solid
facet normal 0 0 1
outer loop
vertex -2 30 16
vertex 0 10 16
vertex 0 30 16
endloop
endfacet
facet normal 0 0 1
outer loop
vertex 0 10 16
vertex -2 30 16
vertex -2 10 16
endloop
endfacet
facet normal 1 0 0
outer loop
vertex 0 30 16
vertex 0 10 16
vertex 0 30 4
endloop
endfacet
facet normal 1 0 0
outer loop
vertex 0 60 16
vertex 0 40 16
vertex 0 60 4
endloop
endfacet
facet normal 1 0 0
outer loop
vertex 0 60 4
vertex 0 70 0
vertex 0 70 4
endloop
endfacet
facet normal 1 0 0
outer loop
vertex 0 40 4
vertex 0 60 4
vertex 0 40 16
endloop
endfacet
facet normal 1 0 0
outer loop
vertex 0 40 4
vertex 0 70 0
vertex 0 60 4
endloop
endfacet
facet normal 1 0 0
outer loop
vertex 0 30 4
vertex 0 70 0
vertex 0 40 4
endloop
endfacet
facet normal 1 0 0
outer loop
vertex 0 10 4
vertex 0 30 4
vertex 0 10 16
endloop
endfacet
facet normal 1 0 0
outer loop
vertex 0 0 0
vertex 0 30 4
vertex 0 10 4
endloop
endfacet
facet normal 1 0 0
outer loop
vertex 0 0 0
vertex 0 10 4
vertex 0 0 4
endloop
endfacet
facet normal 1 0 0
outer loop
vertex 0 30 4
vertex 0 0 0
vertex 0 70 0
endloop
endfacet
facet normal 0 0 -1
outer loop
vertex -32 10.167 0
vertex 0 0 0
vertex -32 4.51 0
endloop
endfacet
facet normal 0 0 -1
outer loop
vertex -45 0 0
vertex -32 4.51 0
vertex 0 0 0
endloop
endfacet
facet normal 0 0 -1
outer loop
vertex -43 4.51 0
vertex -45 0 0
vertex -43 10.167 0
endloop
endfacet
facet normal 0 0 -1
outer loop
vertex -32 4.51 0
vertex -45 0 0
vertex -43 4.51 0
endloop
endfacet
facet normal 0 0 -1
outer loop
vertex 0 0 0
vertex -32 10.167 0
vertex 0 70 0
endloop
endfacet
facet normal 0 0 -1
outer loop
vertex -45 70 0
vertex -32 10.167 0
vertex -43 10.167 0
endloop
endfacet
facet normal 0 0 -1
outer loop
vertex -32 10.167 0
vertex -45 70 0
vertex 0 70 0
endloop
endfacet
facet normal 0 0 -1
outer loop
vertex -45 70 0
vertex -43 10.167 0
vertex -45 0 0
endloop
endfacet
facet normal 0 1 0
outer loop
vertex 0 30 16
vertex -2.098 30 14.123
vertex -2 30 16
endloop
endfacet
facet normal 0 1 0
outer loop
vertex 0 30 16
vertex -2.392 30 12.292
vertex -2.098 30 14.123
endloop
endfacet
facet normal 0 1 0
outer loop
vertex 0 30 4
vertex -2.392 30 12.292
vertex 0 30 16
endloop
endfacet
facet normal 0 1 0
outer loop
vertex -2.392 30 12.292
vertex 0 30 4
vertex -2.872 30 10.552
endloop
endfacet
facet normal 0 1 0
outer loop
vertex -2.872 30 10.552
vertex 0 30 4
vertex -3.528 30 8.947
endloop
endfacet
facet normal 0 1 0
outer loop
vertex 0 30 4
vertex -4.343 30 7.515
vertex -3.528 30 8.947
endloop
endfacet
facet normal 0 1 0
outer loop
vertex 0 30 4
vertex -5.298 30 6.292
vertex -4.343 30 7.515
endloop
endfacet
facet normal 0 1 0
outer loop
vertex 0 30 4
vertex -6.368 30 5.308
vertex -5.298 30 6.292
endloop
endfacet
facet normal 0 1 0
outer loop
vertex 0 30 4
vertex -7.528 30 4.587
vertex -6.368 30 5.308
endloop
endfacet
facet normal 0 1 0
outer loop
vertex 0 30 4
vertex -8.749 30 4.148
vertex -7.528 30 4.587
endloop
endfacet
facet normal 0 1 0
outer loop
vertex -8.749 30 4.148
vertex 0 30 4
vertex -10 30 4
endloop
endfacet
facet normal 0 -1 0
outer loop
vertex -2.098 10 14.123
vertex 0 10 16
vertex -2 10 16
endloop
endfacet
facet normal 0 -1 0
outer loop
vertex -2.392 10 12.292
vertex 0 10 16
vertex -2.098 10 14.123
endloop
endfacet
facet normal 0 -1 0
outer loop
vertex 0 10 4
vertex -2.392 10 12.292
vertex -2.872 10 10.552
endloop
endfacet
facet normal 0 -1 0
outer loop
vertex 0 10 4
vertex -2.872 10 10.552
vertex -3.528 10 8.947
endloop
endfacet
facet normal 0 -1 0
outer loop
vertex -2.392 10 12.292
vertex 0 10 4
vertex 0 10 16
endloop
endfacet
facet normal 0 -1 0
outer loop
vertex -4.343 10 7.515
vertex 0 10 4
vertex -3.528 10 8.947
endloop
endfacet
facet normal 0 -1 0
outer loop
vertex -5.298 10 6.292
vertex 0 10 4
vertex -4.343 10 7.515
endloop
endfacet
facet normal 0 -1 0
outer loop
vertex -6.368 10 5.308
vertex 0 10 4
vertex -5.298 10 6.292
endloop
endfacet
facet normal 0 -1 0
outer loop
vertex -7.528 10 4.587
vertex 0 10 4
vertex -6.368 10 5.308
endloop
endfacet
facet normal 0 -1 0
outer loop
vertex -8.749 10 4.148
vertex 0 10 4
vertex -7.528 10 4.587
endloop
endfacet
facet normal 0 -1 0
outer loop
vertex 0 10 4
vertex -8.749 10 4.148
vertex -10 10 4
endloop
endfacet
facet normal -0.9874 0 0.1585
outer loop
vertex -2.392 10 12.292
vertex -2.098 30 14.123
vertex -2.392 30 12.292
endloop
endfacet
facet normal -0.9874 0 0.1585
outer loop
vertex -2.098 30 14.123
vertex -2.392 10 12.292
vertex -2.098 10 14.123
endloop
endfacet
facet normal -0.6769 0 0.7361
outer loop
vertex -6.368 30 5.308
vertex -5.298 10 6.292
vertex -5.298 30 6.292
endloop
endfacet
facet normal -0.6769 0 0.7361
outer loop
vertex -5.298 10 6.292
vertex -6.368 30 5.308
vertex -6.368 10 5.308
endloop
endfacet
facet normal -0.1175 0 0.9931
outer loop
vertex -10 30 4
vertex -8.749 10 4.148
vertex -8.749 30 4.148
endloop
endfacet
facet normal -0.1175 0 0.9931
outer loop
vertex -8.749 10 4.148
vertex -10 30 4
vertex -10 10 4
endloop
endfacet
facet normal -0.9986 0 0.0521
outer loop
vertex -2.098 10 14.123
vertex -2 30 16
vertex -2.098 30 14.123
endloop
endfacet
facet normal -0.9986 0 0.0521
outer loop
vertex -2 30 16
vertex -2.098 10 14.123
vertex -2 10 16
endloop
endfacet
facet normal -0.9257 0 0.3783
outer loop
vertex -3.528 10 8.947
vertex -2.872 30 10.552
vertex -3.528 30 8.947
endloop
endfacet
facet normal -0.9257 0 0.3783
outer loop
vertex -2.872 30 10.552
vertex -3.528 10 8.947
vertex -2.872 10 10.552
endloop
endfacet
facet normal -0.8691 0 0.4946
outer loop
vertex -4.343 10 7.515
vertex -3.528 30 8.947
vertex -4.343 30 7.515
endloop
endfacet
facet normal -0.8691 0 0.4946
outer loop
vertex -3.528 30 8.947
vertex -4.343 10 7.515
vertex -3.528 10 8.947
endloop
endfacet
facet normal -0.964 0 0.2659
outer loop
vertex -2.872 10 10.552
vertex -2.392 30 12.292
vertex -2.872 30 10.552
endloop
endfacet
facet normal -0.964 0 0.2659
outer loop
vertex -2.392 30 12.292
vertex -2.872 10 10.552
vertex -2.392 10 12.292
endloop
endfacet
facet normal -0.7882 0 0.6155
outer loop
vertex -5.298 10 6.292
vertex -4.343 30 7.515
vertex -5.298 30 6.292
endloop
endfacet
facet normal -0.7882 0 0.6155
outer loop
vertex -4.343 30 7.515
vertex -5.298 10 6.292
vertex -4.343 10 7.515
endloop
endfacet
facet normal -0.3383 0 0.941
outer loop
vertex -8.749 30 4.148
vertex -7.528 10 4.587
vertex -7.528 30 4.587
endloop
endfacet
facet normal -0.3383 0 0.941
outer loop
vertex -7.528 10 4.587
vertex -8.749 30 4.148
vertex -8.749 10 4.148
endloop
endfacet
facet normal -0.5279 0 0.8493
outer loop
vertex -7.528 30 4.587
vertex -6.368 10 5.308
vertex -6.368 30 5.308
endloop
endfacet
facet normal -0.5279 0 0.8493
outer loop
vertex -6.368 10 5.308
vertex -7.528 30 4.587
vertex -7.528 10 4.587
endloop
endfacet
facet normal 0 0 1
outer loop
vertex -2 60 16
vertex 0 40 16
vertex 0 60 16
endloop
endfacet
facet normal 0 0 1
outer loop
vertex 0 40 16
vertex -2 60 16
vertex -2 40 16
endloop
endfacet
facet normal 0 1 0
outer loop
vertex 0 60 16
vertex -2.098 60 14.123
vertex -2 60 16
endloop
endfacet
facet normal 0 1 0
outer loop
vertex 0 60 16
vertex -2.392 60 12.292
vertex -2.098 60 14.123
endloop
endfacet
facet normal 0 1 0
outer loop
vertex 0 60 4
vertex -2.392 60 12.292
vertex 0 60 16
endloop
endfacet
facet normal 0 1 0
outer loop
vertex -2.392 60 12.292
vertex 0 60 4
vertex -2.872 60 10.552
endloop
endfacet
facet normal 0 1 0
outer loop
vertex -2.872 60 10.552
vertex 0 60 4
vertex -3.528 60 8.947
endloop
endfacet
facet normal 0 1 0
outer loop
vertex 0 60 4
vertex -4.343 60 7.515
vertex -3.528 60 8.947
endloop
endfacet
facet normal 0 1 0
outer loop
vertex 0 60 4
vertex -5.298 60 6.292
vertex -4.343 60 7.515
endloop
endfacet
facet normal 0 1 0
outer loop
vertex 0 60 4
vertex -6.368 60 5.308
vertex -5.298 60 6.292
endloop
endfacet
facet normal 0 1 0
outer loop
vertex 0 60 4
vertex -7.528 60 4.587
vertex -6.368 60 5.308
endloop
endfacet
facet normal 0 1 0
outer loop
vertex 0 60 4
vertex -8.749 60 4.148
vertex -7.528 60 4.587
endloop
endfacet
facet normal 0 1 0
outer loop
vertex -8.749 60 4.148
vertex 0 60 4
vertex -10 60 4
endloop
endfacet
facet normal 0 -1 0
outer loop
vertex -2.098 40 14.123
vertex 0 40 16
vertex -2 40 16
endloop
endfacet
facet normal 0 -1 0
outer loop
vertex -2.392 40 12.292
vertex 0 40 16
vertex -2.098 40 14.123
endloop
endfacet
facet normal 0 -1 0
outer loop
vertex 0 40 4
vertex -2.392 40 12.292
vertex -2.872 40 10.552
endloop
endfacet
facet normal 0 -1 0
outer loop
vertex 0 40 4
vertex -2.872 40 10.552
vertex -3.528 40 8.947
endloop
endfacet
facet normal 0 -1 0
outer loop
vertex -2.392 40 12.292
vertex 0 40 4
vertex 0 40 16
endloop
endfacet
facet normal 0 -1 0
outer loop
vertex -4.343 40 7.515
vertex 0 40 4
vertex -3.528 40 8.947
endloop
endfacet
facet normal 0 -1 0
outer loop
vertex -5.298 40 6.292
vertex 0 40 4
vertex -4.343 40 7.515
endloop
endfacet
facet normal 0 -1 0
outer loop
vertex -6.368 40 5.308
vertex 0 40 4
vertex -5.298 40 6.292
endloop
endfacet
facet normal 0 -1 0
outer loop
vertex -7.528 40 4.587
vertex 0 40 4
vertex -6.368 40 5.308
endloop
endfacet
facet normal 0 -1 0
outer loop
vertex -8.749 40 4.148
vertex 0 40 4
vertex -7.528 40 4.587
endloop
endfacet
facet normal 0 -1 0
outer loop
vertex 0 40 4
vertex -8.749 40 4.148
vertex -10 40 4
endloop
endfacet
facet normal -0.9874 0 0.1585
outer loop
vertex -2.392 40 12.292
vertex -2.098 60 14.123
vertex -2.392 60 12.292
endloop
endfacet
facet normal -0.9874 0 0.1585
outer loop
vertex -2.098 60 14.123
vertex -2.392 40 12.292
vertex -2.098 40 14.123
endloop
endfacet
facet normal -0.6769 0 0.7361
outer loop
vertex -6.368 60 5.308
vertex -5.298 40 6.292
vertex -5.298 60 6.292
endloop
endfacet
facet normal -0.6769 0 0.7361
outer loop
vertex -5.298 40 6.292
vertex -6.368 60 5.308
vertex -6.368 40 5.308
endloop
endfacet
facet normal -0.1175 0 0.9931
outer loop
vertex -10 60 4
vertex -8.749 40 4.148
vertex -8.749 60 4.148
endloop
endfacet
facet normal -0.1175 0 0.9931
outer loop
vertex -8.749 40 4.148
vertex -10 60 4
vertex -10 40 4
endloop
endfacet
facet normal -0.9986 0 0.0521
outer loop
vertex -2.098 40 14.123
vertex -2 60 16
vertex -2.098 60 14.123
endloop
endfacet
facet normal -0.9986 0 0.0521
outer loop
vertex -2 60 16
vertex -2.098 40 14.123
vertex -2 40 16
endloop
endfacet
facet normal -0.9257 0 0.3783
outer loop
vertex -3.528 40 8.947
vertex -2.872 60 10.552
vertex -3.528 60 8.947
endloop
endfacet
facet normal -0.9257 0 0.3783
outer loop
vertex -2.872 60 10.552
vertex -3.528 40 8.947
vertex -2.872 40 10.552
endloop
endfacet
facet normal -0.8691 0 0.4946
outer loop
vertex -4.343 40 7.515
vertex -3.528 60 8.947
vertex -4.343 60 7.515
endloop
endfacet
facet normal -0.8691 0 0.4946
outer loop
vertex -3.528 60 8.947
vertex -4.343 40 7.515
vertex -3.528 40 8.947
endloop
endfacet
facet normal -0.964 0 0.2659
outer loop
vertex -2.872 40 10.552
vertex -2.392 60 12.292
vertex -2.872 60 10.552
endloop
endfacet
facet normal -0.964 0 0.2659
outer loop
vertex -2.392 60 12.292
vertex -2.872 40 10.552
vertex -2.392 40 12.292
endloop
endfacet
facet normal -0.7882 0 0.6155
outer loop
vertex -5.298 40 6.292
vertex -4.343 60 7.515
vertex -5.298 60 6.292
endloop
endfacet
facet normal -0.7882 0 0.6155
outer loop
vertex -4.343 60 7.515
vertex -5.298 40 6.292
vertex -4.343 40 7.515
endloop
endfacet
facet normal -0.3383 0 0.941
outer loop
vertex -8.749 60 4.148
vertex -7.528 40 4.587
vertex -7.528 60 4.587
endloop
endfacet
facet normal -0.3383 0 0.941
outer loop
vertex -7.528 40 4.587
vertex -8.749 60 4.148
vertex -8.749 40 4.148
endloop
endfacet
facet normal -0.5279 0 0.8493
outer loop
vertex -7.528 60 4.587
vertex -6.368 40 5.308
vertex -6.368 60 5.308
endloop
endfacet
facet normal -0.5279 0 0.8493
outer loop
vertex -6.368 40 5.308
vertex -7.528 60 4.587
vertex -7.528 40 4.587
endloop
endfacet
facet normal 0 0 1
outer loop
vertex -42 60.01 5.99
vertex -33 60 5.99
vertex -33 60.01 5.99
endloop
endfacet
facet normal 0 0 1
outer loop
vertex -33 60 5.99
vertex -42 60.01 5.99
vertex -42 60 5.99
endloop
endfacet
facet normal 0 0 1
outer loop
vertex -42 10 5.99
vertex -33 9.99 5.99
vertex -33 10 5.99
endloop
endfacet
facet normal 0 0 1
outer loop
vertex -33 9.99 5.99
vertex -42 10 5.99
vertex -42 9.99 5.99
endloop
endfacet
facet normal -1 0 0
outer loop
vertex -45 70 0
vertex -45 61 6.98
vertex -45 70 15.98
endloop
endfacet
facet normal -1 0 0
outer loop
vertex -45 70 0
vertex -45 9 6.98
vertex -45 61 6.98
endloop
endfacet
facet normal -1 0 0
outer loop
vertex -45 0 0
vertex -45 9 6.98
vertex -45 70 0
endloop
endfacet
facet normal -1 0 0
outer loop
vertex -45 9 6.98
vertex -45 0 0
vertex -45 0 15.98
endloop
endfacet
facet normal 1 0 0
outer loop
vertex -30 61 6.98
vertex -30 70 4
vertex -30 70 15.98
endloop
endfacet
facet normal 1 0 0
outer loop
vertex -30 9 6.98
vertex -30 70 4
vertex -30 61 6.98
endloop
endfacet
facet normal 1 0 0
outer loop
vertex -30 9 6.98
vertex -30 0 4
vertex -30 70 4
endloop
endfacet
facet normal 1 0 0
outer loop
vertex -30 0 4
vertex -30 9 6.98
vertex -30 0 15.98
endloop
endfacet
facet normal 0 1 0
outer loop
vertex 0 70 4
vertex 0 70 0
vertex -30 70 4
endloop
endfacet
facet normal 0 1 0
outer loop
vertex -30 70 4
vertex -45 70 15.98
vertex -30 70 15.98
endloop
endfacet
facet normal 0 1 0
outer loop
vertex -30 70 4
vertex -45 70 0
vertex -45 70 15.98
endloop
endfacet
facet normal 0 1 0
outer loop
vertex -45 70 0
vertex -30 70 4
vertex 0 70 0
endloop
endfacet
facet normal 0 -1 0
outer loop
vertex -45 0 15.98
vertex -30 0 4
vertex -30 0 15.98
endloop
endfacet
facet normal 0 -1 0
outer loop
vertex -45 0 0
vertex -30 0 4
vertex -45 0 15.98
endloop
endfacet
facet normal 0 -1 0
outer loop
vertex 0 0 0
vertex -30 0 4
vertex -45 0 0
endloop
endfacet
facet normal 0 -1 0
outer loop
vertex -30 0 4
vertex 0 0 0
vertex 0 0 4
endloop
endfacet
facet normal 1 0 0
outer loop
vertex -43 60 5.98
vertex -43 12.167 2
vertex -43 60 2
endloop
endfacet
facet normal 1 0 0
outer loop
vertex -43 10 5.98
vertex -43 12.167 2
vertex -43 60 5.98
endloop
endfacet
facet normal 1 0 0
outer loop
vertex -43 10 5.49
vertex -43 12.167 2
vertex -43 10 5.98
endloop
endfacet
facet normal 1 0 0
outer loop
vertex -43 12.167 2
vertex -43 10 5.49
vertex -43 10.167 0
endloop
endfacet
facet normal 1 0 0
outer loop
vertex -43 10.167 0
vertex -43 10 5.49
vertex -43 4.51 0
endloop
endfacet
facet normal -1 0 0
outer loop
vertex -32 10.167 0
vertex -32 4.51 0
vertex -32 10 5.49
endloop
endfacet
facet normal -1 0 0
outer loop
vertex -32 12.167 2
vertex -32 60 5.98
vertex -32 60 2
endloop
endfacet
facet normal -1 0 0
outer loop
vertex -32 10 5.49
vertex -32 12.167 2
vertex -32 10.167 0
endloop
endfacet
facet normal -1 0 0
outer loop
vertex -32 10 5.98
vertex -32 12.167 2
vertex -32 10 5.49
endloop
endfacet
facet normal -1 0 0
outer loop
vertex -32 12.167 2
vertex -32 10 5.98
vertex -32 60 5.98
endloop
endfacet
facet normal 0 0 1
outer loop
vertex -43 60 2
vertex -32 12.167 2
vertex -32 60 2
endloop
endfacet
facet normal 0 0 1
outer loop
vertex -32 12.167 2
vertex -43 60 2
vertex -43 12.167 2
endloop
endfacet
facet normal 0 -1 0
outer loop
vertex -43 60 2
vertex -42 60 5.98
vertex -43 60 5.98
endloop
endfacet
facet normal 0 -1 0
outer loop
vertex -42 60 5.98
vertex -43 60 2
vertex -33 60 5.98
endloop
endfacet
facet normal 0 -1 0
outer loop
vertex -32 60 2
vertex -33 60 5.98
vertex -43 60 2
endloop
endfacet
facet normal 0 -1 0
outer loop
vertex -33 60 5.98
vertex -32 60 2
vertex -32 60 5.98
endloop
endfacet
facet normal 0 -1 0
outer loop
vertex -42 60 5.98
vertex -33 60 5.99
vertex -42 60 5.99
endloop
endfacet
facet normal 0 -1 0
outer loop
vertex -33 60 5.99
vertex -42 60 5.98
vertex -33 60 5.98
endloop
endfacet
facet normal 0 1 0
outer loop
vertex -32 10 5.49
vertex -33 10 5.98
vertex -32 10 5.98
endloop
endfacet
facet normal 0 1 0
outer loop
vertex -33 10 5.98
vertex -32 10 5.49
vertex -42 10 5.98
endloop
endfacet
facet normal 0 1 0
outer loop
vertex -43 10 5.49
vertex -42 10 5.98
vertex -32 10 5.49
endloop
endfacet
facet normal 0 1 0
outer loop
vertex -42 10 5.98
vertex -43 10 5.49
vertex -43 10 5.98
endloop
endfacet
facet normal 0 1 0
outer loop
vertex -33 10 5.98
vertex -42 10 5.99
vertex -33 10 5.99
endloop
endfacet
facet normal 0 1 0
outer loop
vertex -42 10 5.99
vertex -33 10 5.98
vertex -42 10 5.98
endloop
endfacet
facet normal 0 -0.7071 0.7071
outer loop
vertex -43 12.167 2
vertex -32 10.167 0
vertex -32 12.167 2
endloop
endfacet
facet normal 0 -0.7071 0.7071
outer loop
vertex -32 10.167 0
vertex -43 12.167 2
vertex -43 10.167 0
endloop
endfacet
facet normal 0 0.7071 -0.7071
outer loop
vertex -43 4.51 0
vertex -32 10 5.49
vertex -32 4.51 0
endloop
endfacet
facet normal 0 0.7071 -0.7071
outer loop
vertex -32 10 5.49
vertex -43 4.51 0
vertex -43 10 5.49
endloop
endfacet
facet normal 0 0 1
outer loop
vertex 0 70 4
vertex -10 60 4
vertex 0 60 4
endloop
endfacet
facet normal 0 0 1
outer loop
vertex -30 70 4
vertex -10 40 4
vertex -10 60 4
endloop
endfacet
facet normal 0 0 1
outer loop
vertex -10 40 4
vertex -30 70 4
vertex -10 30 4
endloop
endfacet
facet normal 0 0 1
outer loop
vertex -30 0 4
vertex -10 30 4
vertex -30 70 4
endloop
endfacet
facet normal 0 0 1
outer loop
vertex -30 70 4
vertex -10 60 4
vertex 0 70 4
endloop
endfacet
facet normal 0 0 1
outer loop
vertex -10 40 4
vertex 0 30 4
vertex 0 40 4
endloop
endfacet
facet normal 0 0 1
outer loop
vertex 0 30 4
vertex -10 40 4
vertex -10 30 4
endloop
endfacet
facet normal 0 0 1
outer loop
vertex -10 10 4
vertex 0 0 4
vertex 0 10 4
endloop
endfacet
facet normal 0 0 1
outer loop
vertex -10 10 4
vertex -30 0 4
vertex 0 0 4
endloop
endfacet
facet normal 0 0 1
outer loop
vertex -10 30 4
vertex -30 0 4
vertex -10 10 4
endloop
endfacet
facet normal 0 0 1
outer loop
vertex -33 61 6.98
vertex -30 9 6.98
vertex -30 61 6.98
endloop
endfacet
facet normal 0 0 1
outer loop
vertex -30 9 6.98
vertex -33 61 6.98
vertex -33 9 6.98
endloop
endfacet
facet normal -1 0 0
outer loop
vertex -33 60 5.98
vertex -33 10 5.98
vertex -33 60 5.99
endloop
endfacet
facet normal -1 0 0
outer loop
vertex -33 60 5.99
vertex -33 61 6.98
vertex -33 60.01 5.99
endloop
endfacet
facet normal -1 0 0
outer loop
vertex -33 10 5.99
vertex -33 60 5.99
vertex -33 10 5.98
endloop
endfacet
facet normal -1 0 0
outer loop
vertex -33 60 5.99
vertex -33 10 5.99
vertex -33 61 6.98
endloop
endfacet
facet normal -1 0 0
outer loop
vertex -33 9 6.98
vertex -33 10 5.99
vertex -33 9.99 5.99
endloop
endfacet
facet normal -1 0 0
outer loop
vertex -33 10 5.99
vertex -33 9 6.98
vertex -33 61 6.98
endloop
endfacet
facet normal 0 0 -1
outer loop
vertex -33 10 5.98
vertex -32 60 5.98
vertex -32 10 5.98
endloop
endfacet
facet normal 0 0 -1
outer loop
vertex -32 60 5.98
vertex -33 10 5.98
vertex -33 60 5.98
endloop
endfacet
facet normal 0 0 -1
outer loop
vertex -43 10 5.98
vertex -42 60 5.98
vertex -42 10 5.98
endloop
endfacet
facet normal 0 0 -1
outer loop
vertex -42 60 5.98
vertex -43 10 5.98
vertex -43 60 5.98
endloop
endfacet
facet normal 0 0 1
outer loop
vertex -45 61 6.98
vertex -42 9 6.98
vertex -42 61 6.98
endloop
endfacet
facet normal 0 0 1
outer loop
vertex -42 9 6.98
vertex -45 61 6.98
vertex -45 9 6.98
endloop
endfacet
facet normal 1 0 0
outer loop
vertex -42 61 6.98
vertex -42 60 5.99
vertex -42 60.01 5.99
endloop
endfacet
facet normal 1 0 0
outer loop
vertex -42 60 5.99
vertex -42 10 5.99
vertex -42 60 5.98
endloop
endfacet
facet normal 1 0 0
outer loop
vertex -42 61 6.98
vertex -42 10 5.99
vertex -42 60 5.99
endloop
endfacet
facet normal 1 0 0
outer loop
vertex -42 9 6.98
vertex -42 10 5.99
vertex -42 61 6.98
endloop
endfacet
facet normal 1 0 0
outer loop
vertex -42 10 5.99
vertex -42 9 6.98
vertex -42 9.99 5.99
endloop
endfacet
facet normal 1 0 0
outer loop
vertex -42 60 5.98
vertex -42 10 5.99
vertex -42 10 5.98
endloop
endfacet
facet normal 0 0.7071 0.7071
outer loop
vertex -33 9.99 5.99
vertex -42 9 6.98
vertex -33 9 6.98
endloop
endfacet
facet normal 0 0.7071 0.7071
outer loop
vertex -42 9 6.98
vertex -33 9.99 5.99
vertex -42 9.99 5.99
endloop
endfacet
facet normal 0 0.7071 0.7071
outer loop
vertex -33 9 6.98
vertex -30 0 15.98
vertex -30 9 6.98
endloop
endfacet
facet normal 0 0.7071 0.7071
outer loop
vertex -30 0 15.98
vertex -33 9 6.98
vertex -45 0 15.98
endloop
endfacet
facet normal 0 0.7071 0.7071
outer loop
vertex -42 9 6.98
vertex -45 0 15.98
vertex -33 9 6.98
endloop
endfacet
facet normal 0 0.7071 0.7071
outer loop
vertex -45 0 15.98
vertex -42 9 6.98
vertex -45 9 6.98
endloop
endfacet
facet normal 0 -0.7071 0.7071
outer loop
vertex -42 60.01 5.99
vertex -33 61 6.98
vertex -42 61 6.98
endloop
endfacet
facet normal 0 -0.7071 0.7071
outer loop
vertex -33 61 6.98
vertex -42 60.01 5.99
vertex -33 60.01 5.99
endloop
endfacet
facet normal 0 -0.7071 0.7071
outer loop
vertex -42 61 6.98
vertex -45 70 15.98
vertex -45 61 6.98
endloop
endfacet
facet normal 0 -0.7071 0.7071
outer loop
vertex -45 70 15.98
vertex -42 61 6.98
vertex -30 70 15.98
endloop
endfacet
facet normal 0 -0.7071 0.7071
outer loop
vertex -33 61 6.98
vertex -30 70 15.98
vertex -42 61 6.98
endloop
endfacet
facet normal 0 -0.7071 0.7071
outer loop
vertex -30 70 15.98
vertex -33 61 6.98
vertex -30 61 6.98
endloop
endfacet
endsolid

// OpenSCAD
rotate([0,-90]) {
cube([4,70,30]);
translate([0,10,0]) difference() {
  cube([16,20,10]);
  translate([16,-.01,10]) rotate([-90,0]) scale([1.5,1]) cylinder(d=16,h=20.02,$fn=40);
}
translate([0,40,0]) difference() {
  cube([16,20,10]);
  translate([16,-.01,10]) rotate([-90,0]) scale([1.5,1]) cylinder(d=16,h=20.02,$fn=40);
}
translate([5.98,0,30]) cube([1,70,3]);
translate([5.98,0,42]) cube([1,70,3]);
difference(){
  translate([0,0,30]) cube([5.99,70,15]);
  translate([2,10,32]) cube([4,50,11]);
  translate([-.01,4.5,32]) rotate([0,0,45]) cube([10.02,4,11]);
}
translate([5.98,0,30]) linear_extrude(15) polygon([[0,0],[0,10],[10,0]]);
translate([0,70,0]) mirror([0,1]) translate([5.98,0,30]) linear_extrude(15) polygon([[0,0],[0,10],[10,0]]);
}
